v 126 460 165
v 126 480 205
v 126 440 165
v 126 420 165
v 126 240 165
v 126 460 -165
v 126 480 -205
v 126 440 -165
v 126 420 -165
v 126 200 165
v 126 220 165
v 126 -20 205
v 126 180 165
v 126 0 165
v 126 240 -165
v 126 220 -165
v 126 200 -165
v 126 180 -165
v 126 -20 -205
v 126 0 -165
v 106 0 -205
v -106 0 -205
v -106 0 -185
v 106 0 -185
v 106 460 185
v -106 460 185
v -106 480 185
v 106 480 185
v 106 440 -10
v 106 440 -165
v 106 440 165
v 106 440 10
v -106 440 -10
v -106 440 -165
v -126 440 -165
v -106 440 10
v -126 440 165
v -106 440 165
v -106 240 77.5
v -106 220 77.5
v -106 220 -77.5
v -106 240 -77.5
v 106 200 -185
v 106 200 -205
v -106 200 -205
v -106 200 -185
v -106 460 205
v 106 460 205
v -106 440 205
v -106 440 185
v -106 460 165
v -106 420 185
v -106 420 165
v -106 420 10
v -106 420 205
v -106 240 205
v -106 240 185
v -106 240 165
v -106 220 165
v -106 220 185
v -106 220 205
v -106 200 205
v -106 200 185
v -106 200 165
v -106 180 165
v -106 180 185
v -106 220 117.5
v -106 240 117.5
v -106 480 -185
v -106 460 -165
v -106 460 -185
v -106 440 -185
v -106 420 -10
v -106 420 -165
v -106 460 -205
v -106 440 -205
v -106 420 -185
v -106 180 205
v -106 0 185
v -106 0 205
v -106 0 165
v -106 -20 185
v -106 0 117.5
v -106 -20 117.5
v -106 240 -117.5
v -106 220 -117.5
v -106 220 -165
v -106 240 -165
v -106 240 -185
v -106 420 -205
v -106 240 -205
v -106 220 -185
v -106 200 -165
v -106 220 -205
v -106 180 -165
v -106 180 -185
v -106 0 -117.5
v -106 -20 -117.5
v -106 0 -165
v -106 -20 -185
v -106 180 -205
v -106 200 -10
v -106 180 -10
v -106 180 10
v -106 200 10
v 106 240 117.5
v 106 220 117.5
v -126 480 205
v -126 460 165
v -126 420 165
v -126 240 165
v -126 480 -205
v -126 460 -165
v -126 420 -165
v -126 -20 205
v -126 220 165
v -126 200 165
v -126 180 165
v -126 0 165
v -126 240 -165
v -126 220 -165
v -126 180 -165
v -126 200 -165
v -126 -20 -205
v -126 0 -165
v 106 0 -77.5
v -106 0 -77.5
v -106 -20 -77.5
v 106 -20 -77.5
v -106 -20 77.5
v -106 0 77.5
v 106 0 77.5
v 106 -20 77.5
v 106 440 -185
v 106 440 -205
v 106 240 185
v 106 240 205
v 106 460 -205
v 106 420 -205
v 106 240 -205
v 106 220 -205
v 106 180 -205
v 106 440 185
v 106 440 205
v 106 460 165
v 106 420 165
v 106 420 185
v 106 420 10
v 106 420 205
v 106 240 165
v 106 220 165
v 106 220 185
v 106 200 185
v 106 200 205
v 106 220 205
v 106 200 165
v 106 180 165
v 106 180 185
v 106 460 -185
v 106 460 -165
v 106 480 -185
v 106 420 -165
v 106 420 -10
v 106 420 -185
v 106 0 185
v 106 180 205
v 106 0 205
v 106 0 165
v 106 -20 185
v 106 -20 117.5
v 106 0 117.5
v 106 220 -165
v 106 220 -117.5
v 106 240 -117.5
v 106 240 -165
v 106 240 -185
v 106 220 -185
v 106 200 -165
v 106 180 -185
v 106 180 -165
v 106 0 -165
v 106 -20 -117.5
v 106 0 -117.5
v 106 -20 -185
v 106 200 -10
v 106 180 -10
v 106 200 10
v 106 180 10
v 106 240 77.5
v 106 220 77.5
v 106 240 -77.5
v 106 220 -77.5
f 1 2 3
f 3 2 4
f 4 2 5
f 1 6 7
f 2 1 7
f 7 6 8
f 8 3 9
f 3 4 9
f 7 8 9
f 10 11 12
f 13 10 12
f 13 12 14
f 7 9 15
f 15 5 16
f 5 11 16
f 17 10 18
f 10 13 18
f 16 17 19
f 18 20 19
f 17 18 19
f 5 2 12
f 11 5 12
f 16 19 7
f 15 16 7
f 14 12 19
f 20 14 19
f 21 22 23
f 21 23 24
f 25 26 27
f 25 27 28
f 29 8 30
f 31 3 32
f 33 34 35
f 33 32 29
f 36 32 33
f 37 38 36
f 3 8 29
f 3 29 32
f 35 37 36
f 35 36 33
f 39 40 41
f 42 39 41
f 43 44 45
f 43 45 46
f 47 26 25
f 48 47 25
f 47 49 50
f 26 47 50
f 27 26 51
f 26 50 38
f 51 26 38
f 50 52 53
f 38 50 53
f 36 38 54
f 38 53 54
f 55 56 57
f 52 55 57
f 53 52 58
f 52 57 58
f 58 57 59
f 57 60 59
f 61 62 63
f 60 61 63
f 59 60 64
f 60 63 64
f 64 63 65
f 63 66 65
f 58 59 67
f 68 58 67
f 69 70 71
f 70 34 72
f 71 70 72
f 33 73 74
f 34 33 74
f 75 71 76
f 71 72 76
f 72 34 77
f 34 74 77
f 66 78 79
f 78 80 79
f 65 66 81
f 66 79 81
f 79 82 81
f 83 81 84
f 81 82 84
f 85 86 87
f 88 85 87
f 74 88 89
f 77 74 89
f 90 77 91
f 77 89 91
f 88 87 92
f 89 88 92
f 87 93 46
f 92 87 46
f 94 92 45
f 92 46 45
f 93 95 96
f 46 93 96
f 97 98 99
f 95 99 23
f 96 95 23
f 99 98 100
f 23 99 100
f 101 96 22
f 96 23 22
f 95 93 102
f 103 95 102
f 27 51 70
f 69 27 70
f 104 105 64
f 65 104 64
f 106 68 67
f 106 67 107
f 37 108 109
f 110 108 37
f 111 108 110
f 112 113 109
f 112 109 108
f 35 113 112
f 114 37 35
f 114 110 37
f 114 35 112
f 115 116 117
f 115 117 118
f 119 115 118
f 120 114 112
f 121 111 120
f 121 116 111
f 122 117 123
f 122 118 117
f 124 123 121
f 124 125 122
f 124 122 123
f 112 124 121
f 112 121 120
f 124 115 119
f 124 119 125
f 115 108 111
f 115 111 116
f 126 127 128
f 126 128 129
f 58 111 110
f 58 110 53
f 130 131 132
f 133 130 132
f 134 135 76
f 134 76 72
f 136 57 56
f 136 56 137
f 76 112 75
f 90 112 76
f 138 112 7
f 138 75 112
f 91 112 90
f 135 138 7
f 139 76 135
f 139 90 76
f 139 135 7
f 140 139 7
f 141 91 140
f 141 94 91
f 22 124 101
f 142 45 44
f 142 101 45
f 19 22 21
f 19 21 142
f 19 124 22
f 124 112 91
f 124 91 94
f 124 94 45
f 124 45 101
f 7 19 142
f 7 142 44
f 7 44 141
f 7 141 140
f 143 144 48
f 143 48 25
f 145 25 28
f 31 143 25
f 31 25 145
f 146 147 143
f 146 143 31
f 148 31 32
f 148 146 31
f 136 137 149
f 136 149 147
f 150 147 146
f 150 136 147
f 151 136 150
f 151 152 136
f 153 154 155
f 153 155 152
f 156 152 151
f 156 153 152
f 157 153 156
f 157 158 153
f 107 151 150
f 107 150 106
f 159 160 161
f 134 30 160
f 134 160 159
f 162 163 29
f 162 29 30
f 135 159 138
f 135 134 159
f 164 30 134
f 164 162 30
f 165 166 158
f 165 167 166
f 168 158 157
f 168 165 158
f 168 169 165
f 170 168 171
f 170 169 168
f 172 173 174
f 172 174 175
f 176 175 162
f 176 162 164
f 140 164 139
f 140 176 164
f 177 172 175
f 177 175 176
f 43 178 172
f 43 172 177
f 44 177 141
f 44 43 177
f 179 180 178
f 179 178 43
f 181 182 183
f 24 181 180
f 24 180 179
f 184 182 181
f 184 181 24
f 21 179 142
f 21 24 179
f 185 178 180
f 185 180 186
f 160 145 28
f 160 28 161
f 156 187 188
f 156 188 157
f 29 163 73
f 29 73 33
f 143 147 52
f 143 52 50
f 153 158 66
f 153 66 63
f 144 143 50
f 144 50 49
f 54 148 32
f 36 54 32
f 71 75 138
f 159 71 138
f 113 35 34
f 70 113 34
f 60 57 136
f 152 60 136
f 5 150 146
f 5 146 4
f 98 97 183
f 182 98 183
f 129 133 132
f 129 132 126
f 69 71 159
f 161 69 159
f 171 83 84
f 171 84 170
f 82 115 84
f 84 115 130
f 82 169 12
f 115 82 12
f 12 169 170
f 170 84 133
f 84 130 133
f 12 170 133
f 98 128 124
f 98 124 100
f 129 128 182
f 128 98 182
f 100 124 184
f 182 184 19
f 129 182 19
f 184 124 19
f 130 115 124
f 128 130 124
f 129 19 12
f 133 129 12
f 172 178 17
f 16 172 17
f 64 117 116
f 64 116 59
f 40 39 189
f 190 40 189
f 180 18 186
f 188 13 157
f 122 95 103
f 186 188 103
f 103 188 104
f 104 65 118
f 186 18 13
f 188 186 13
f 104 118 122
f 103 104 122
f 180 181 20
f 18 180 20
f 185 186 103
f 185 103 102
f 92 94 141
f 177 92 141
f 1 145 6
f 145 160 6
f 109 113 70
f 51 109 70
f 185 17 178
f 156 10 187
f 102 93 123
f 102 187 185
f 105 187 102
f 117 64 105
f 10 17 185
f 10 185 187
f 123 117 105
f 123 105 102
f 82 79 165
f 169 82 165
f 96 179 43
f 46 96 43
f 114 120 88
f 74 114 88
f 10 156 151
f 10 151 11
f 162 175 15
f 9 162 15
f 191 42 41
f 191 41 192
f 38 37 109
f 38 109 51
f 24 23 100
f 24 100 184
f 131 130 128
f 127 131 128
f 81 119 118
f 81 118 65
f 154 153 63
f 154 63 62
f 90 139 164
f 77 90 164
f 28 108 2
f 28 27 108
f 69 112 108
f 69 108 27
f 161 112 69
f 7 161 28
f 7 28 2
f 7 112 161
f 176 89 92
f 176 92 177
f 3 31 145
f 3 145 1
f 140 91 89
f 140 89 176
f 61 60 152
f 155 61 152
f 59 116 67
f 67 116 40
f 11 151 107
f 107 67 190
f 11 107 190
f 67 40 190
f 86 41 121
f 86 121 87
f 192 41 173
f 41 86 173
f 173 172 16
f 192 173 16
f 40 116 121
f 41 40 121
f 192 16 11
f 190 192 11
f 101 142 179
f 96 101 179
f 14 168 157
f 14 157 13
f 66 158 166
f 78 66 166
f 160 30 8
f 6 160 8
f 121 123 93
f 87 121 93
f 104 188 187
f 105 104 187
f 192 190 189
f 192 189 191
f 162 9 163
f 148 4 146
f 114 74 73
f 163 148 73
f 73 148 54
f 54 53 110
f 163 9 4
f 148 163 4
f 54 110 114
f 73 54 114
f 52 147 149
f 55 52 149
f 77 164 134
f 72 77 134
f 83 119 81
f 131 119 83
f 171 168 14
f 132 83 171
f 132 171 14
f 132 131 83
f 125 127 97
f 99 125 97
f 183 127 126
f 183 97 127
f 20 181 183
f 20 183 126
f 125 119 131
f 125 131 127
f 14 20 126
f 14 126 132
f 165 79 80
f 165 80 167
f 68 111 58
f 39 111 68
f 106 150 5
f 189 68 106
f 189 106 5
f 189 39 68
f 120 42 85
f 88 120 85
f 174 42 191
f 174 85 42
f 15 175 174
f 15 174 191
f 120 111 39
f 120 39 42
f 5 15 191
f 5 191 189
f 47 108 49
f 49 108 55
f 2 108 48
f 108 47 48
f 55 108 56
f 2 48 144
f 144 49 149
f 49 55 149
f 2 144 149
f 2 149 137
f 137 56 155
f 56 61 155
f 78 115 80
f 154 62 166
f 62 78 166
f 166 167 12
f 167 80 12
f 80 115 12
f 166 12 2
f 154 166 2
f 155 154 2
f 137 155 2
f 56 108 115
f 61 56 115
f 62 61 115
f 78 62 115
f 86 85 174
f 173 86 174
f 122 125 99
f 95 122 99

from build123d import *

# Parameters (mm, degrees)
SKETCH1_W           = 252
SKETCH1_H           = 410
SKETCH1_W_2         = 212
SKETCH1_H_2         = 370
BOSS_EXTRUDE1_DEPTH = 20
SKETCH2_W           = 20
SKETCH2_H           = 40
BOSS_EXTRUDE2_DEPTH = 460
BOSS_EXTRUDE3_START = 460
SKETCH1_3_W         = 252
SKETCH1_3_H         = 410
SKETCH1_3_W_2       = 212
SKETCH1_3_H_2       = 370
BOSS_EXTRUDE3_DEPTH = 20
SKETCH3_W           = 212
SKETCH3_H           = 40
BOSS_EXTRUDE4_DEPTH = 20
SKETCH4_W           = 20
SKETCH4_H           = 20
BOSS_EXTRUDE5_DEPTH = 330
SKETCH6_W           = 20
SKETCH6_H           = 20
BOSS_EXTRUDE6_DEPTH = 212
LPATTERN2_COUNT     = 2
LPATTERN2_PITCH     = 240
LPATTERN1_COUNT     = 2
LPATTERN1_PITCH     = 240
LPATTERN3_COUNT     = 2
LPATTERN3_PITCH     = 240


with BuildPart() as part:
    # Sketch1 → Boss-Extrude1 (new body)
    with BuildSketch(Plane(origin=(0, 0, 0), x_dir=(1, 0, 0), z_dir=(0, 1, 0))):
        Rectangle(SKETCH1_W, SKETCH1_H)
        Rectangle(SKETCH1_W_2, SKETCH1_H_2, mode=Mode.SUBTRACT)
    boss_extrude1 = extrude(amount=-BOSS_EXTRUDE1_DEPTH)

    # Sketch2 → Boss-Extrude2 (add)
    with BuildSketch(Plane(origin=(0, 0, 0), x_dir=(1, 0, 0), z_dir=(0, 1, 0))):
        with Locations((-116, 185)):
            Rectangle(SKETCH2_W, SKETCH2_H)
        with Locations((-116, -185)):
            Rectangle(SKETCH2_W, SKETCH2_H)
        with Locations((116, -185)):
            Rectangle(SKETCH2_W, SKETCH2_H)
        with Locations((116, 185)):
            Rectangle(SKETCH2_W, SKETCH2_H)
    extrude(amount=BOSS_EXTRUDE2_DEPTH)

    # Sketch1<3> → Boss-Extrude3 (add)
    with BuildSketch(Plane(origin=(0, 0, 0), x_dir=(1, 0, 0), z_dir=(0, 1, 0)).offset(BOSS_EXTRUDE3_START)):
        Rectangle(SKETCH1_3_W, SKETCH1_3_H)
        Rectangle(SKETCH1_3_W_2, SKETCH1_3_H_2, mode=Mode.SUBTRACT)
    extrude(amount=BOSS_EXTRUDE3_DEPTH)

    # Sketch3 → Boss-Extrude4 (add)
    with BuildSketch(Plane(origin=(0, 0, 0), x_dir=(1, 0, 0), z_dir=(0, 1, 0))):
        with Locations((0, -97.5)):
            Rectangle(SKETCH3_W, SKETCH3_H)
        with Locations((0, 97.5)):
            Rectangle(SKETCH3_W, SKETCH3_H)
    boss_extrude4 = extrude(amount=-BOSS_EXTRUDE4_DEPTH)

    # Sketch4 → Boss-Extrude5 (add)
    with BuildSketch(Plane(origin=(0, 0, 165), x_dir=(-1, 0, 0), z_dir=(0, 0, -1))):
        with Locations((-116, 190)):
            Rectangle(SKETCH4_W, SKETCH4_H)
        with Locations((116, 190)):
            Rectangle(SKETCH4_W, SKETCH4_H)
    boss_extrude5 = extrude(amount=BOSS_EXTRUDE5_DEPTH)

    # Sketch6 → Boss-Extrude6 (add)
    with BuildSketch(Plane.ZY.offset(-106)):
        with Locations((-195, 190)):
            Rectangle(SKETCH6_W, SKETCH6_H)
        with Locations((0, 190)):
            Rectangle(SKETCH6_W, SKETCH6_H)
        with Locations((195, 190)):
            Rectangle(SKETCH6_W, SKETCH6_H)
    boss_extrude6 = extrude(amount=BOSS_EXTRUDE6_DEPTH)

    # LPattern2: Boss-Extrude5 ×2
    with Locations(*[(0, i * LPATTERN2_PITCH, 0) for i in range(1, LPATTERN2_COUNT)]):
        add(boss_extrude5)

    # LPattern1: Boss-Extrude6 ×2
    with Locations(*[(0, i * LPATTERN1_PITCH, 0) for i in range(1, LPATTERN1_COUNT)]):
        add(boss_extrude6)

    # LPattern3: Boss-Extrude1, Boss-Extrude4 ×2
    with Locations(*[(0, i * LPATTERN3_PITCH, 0) for i in range(1, LPATTERN3_COUNT)]):
        add(boss_extrude1)
        add(boss_extrude4)


solid = part.part
